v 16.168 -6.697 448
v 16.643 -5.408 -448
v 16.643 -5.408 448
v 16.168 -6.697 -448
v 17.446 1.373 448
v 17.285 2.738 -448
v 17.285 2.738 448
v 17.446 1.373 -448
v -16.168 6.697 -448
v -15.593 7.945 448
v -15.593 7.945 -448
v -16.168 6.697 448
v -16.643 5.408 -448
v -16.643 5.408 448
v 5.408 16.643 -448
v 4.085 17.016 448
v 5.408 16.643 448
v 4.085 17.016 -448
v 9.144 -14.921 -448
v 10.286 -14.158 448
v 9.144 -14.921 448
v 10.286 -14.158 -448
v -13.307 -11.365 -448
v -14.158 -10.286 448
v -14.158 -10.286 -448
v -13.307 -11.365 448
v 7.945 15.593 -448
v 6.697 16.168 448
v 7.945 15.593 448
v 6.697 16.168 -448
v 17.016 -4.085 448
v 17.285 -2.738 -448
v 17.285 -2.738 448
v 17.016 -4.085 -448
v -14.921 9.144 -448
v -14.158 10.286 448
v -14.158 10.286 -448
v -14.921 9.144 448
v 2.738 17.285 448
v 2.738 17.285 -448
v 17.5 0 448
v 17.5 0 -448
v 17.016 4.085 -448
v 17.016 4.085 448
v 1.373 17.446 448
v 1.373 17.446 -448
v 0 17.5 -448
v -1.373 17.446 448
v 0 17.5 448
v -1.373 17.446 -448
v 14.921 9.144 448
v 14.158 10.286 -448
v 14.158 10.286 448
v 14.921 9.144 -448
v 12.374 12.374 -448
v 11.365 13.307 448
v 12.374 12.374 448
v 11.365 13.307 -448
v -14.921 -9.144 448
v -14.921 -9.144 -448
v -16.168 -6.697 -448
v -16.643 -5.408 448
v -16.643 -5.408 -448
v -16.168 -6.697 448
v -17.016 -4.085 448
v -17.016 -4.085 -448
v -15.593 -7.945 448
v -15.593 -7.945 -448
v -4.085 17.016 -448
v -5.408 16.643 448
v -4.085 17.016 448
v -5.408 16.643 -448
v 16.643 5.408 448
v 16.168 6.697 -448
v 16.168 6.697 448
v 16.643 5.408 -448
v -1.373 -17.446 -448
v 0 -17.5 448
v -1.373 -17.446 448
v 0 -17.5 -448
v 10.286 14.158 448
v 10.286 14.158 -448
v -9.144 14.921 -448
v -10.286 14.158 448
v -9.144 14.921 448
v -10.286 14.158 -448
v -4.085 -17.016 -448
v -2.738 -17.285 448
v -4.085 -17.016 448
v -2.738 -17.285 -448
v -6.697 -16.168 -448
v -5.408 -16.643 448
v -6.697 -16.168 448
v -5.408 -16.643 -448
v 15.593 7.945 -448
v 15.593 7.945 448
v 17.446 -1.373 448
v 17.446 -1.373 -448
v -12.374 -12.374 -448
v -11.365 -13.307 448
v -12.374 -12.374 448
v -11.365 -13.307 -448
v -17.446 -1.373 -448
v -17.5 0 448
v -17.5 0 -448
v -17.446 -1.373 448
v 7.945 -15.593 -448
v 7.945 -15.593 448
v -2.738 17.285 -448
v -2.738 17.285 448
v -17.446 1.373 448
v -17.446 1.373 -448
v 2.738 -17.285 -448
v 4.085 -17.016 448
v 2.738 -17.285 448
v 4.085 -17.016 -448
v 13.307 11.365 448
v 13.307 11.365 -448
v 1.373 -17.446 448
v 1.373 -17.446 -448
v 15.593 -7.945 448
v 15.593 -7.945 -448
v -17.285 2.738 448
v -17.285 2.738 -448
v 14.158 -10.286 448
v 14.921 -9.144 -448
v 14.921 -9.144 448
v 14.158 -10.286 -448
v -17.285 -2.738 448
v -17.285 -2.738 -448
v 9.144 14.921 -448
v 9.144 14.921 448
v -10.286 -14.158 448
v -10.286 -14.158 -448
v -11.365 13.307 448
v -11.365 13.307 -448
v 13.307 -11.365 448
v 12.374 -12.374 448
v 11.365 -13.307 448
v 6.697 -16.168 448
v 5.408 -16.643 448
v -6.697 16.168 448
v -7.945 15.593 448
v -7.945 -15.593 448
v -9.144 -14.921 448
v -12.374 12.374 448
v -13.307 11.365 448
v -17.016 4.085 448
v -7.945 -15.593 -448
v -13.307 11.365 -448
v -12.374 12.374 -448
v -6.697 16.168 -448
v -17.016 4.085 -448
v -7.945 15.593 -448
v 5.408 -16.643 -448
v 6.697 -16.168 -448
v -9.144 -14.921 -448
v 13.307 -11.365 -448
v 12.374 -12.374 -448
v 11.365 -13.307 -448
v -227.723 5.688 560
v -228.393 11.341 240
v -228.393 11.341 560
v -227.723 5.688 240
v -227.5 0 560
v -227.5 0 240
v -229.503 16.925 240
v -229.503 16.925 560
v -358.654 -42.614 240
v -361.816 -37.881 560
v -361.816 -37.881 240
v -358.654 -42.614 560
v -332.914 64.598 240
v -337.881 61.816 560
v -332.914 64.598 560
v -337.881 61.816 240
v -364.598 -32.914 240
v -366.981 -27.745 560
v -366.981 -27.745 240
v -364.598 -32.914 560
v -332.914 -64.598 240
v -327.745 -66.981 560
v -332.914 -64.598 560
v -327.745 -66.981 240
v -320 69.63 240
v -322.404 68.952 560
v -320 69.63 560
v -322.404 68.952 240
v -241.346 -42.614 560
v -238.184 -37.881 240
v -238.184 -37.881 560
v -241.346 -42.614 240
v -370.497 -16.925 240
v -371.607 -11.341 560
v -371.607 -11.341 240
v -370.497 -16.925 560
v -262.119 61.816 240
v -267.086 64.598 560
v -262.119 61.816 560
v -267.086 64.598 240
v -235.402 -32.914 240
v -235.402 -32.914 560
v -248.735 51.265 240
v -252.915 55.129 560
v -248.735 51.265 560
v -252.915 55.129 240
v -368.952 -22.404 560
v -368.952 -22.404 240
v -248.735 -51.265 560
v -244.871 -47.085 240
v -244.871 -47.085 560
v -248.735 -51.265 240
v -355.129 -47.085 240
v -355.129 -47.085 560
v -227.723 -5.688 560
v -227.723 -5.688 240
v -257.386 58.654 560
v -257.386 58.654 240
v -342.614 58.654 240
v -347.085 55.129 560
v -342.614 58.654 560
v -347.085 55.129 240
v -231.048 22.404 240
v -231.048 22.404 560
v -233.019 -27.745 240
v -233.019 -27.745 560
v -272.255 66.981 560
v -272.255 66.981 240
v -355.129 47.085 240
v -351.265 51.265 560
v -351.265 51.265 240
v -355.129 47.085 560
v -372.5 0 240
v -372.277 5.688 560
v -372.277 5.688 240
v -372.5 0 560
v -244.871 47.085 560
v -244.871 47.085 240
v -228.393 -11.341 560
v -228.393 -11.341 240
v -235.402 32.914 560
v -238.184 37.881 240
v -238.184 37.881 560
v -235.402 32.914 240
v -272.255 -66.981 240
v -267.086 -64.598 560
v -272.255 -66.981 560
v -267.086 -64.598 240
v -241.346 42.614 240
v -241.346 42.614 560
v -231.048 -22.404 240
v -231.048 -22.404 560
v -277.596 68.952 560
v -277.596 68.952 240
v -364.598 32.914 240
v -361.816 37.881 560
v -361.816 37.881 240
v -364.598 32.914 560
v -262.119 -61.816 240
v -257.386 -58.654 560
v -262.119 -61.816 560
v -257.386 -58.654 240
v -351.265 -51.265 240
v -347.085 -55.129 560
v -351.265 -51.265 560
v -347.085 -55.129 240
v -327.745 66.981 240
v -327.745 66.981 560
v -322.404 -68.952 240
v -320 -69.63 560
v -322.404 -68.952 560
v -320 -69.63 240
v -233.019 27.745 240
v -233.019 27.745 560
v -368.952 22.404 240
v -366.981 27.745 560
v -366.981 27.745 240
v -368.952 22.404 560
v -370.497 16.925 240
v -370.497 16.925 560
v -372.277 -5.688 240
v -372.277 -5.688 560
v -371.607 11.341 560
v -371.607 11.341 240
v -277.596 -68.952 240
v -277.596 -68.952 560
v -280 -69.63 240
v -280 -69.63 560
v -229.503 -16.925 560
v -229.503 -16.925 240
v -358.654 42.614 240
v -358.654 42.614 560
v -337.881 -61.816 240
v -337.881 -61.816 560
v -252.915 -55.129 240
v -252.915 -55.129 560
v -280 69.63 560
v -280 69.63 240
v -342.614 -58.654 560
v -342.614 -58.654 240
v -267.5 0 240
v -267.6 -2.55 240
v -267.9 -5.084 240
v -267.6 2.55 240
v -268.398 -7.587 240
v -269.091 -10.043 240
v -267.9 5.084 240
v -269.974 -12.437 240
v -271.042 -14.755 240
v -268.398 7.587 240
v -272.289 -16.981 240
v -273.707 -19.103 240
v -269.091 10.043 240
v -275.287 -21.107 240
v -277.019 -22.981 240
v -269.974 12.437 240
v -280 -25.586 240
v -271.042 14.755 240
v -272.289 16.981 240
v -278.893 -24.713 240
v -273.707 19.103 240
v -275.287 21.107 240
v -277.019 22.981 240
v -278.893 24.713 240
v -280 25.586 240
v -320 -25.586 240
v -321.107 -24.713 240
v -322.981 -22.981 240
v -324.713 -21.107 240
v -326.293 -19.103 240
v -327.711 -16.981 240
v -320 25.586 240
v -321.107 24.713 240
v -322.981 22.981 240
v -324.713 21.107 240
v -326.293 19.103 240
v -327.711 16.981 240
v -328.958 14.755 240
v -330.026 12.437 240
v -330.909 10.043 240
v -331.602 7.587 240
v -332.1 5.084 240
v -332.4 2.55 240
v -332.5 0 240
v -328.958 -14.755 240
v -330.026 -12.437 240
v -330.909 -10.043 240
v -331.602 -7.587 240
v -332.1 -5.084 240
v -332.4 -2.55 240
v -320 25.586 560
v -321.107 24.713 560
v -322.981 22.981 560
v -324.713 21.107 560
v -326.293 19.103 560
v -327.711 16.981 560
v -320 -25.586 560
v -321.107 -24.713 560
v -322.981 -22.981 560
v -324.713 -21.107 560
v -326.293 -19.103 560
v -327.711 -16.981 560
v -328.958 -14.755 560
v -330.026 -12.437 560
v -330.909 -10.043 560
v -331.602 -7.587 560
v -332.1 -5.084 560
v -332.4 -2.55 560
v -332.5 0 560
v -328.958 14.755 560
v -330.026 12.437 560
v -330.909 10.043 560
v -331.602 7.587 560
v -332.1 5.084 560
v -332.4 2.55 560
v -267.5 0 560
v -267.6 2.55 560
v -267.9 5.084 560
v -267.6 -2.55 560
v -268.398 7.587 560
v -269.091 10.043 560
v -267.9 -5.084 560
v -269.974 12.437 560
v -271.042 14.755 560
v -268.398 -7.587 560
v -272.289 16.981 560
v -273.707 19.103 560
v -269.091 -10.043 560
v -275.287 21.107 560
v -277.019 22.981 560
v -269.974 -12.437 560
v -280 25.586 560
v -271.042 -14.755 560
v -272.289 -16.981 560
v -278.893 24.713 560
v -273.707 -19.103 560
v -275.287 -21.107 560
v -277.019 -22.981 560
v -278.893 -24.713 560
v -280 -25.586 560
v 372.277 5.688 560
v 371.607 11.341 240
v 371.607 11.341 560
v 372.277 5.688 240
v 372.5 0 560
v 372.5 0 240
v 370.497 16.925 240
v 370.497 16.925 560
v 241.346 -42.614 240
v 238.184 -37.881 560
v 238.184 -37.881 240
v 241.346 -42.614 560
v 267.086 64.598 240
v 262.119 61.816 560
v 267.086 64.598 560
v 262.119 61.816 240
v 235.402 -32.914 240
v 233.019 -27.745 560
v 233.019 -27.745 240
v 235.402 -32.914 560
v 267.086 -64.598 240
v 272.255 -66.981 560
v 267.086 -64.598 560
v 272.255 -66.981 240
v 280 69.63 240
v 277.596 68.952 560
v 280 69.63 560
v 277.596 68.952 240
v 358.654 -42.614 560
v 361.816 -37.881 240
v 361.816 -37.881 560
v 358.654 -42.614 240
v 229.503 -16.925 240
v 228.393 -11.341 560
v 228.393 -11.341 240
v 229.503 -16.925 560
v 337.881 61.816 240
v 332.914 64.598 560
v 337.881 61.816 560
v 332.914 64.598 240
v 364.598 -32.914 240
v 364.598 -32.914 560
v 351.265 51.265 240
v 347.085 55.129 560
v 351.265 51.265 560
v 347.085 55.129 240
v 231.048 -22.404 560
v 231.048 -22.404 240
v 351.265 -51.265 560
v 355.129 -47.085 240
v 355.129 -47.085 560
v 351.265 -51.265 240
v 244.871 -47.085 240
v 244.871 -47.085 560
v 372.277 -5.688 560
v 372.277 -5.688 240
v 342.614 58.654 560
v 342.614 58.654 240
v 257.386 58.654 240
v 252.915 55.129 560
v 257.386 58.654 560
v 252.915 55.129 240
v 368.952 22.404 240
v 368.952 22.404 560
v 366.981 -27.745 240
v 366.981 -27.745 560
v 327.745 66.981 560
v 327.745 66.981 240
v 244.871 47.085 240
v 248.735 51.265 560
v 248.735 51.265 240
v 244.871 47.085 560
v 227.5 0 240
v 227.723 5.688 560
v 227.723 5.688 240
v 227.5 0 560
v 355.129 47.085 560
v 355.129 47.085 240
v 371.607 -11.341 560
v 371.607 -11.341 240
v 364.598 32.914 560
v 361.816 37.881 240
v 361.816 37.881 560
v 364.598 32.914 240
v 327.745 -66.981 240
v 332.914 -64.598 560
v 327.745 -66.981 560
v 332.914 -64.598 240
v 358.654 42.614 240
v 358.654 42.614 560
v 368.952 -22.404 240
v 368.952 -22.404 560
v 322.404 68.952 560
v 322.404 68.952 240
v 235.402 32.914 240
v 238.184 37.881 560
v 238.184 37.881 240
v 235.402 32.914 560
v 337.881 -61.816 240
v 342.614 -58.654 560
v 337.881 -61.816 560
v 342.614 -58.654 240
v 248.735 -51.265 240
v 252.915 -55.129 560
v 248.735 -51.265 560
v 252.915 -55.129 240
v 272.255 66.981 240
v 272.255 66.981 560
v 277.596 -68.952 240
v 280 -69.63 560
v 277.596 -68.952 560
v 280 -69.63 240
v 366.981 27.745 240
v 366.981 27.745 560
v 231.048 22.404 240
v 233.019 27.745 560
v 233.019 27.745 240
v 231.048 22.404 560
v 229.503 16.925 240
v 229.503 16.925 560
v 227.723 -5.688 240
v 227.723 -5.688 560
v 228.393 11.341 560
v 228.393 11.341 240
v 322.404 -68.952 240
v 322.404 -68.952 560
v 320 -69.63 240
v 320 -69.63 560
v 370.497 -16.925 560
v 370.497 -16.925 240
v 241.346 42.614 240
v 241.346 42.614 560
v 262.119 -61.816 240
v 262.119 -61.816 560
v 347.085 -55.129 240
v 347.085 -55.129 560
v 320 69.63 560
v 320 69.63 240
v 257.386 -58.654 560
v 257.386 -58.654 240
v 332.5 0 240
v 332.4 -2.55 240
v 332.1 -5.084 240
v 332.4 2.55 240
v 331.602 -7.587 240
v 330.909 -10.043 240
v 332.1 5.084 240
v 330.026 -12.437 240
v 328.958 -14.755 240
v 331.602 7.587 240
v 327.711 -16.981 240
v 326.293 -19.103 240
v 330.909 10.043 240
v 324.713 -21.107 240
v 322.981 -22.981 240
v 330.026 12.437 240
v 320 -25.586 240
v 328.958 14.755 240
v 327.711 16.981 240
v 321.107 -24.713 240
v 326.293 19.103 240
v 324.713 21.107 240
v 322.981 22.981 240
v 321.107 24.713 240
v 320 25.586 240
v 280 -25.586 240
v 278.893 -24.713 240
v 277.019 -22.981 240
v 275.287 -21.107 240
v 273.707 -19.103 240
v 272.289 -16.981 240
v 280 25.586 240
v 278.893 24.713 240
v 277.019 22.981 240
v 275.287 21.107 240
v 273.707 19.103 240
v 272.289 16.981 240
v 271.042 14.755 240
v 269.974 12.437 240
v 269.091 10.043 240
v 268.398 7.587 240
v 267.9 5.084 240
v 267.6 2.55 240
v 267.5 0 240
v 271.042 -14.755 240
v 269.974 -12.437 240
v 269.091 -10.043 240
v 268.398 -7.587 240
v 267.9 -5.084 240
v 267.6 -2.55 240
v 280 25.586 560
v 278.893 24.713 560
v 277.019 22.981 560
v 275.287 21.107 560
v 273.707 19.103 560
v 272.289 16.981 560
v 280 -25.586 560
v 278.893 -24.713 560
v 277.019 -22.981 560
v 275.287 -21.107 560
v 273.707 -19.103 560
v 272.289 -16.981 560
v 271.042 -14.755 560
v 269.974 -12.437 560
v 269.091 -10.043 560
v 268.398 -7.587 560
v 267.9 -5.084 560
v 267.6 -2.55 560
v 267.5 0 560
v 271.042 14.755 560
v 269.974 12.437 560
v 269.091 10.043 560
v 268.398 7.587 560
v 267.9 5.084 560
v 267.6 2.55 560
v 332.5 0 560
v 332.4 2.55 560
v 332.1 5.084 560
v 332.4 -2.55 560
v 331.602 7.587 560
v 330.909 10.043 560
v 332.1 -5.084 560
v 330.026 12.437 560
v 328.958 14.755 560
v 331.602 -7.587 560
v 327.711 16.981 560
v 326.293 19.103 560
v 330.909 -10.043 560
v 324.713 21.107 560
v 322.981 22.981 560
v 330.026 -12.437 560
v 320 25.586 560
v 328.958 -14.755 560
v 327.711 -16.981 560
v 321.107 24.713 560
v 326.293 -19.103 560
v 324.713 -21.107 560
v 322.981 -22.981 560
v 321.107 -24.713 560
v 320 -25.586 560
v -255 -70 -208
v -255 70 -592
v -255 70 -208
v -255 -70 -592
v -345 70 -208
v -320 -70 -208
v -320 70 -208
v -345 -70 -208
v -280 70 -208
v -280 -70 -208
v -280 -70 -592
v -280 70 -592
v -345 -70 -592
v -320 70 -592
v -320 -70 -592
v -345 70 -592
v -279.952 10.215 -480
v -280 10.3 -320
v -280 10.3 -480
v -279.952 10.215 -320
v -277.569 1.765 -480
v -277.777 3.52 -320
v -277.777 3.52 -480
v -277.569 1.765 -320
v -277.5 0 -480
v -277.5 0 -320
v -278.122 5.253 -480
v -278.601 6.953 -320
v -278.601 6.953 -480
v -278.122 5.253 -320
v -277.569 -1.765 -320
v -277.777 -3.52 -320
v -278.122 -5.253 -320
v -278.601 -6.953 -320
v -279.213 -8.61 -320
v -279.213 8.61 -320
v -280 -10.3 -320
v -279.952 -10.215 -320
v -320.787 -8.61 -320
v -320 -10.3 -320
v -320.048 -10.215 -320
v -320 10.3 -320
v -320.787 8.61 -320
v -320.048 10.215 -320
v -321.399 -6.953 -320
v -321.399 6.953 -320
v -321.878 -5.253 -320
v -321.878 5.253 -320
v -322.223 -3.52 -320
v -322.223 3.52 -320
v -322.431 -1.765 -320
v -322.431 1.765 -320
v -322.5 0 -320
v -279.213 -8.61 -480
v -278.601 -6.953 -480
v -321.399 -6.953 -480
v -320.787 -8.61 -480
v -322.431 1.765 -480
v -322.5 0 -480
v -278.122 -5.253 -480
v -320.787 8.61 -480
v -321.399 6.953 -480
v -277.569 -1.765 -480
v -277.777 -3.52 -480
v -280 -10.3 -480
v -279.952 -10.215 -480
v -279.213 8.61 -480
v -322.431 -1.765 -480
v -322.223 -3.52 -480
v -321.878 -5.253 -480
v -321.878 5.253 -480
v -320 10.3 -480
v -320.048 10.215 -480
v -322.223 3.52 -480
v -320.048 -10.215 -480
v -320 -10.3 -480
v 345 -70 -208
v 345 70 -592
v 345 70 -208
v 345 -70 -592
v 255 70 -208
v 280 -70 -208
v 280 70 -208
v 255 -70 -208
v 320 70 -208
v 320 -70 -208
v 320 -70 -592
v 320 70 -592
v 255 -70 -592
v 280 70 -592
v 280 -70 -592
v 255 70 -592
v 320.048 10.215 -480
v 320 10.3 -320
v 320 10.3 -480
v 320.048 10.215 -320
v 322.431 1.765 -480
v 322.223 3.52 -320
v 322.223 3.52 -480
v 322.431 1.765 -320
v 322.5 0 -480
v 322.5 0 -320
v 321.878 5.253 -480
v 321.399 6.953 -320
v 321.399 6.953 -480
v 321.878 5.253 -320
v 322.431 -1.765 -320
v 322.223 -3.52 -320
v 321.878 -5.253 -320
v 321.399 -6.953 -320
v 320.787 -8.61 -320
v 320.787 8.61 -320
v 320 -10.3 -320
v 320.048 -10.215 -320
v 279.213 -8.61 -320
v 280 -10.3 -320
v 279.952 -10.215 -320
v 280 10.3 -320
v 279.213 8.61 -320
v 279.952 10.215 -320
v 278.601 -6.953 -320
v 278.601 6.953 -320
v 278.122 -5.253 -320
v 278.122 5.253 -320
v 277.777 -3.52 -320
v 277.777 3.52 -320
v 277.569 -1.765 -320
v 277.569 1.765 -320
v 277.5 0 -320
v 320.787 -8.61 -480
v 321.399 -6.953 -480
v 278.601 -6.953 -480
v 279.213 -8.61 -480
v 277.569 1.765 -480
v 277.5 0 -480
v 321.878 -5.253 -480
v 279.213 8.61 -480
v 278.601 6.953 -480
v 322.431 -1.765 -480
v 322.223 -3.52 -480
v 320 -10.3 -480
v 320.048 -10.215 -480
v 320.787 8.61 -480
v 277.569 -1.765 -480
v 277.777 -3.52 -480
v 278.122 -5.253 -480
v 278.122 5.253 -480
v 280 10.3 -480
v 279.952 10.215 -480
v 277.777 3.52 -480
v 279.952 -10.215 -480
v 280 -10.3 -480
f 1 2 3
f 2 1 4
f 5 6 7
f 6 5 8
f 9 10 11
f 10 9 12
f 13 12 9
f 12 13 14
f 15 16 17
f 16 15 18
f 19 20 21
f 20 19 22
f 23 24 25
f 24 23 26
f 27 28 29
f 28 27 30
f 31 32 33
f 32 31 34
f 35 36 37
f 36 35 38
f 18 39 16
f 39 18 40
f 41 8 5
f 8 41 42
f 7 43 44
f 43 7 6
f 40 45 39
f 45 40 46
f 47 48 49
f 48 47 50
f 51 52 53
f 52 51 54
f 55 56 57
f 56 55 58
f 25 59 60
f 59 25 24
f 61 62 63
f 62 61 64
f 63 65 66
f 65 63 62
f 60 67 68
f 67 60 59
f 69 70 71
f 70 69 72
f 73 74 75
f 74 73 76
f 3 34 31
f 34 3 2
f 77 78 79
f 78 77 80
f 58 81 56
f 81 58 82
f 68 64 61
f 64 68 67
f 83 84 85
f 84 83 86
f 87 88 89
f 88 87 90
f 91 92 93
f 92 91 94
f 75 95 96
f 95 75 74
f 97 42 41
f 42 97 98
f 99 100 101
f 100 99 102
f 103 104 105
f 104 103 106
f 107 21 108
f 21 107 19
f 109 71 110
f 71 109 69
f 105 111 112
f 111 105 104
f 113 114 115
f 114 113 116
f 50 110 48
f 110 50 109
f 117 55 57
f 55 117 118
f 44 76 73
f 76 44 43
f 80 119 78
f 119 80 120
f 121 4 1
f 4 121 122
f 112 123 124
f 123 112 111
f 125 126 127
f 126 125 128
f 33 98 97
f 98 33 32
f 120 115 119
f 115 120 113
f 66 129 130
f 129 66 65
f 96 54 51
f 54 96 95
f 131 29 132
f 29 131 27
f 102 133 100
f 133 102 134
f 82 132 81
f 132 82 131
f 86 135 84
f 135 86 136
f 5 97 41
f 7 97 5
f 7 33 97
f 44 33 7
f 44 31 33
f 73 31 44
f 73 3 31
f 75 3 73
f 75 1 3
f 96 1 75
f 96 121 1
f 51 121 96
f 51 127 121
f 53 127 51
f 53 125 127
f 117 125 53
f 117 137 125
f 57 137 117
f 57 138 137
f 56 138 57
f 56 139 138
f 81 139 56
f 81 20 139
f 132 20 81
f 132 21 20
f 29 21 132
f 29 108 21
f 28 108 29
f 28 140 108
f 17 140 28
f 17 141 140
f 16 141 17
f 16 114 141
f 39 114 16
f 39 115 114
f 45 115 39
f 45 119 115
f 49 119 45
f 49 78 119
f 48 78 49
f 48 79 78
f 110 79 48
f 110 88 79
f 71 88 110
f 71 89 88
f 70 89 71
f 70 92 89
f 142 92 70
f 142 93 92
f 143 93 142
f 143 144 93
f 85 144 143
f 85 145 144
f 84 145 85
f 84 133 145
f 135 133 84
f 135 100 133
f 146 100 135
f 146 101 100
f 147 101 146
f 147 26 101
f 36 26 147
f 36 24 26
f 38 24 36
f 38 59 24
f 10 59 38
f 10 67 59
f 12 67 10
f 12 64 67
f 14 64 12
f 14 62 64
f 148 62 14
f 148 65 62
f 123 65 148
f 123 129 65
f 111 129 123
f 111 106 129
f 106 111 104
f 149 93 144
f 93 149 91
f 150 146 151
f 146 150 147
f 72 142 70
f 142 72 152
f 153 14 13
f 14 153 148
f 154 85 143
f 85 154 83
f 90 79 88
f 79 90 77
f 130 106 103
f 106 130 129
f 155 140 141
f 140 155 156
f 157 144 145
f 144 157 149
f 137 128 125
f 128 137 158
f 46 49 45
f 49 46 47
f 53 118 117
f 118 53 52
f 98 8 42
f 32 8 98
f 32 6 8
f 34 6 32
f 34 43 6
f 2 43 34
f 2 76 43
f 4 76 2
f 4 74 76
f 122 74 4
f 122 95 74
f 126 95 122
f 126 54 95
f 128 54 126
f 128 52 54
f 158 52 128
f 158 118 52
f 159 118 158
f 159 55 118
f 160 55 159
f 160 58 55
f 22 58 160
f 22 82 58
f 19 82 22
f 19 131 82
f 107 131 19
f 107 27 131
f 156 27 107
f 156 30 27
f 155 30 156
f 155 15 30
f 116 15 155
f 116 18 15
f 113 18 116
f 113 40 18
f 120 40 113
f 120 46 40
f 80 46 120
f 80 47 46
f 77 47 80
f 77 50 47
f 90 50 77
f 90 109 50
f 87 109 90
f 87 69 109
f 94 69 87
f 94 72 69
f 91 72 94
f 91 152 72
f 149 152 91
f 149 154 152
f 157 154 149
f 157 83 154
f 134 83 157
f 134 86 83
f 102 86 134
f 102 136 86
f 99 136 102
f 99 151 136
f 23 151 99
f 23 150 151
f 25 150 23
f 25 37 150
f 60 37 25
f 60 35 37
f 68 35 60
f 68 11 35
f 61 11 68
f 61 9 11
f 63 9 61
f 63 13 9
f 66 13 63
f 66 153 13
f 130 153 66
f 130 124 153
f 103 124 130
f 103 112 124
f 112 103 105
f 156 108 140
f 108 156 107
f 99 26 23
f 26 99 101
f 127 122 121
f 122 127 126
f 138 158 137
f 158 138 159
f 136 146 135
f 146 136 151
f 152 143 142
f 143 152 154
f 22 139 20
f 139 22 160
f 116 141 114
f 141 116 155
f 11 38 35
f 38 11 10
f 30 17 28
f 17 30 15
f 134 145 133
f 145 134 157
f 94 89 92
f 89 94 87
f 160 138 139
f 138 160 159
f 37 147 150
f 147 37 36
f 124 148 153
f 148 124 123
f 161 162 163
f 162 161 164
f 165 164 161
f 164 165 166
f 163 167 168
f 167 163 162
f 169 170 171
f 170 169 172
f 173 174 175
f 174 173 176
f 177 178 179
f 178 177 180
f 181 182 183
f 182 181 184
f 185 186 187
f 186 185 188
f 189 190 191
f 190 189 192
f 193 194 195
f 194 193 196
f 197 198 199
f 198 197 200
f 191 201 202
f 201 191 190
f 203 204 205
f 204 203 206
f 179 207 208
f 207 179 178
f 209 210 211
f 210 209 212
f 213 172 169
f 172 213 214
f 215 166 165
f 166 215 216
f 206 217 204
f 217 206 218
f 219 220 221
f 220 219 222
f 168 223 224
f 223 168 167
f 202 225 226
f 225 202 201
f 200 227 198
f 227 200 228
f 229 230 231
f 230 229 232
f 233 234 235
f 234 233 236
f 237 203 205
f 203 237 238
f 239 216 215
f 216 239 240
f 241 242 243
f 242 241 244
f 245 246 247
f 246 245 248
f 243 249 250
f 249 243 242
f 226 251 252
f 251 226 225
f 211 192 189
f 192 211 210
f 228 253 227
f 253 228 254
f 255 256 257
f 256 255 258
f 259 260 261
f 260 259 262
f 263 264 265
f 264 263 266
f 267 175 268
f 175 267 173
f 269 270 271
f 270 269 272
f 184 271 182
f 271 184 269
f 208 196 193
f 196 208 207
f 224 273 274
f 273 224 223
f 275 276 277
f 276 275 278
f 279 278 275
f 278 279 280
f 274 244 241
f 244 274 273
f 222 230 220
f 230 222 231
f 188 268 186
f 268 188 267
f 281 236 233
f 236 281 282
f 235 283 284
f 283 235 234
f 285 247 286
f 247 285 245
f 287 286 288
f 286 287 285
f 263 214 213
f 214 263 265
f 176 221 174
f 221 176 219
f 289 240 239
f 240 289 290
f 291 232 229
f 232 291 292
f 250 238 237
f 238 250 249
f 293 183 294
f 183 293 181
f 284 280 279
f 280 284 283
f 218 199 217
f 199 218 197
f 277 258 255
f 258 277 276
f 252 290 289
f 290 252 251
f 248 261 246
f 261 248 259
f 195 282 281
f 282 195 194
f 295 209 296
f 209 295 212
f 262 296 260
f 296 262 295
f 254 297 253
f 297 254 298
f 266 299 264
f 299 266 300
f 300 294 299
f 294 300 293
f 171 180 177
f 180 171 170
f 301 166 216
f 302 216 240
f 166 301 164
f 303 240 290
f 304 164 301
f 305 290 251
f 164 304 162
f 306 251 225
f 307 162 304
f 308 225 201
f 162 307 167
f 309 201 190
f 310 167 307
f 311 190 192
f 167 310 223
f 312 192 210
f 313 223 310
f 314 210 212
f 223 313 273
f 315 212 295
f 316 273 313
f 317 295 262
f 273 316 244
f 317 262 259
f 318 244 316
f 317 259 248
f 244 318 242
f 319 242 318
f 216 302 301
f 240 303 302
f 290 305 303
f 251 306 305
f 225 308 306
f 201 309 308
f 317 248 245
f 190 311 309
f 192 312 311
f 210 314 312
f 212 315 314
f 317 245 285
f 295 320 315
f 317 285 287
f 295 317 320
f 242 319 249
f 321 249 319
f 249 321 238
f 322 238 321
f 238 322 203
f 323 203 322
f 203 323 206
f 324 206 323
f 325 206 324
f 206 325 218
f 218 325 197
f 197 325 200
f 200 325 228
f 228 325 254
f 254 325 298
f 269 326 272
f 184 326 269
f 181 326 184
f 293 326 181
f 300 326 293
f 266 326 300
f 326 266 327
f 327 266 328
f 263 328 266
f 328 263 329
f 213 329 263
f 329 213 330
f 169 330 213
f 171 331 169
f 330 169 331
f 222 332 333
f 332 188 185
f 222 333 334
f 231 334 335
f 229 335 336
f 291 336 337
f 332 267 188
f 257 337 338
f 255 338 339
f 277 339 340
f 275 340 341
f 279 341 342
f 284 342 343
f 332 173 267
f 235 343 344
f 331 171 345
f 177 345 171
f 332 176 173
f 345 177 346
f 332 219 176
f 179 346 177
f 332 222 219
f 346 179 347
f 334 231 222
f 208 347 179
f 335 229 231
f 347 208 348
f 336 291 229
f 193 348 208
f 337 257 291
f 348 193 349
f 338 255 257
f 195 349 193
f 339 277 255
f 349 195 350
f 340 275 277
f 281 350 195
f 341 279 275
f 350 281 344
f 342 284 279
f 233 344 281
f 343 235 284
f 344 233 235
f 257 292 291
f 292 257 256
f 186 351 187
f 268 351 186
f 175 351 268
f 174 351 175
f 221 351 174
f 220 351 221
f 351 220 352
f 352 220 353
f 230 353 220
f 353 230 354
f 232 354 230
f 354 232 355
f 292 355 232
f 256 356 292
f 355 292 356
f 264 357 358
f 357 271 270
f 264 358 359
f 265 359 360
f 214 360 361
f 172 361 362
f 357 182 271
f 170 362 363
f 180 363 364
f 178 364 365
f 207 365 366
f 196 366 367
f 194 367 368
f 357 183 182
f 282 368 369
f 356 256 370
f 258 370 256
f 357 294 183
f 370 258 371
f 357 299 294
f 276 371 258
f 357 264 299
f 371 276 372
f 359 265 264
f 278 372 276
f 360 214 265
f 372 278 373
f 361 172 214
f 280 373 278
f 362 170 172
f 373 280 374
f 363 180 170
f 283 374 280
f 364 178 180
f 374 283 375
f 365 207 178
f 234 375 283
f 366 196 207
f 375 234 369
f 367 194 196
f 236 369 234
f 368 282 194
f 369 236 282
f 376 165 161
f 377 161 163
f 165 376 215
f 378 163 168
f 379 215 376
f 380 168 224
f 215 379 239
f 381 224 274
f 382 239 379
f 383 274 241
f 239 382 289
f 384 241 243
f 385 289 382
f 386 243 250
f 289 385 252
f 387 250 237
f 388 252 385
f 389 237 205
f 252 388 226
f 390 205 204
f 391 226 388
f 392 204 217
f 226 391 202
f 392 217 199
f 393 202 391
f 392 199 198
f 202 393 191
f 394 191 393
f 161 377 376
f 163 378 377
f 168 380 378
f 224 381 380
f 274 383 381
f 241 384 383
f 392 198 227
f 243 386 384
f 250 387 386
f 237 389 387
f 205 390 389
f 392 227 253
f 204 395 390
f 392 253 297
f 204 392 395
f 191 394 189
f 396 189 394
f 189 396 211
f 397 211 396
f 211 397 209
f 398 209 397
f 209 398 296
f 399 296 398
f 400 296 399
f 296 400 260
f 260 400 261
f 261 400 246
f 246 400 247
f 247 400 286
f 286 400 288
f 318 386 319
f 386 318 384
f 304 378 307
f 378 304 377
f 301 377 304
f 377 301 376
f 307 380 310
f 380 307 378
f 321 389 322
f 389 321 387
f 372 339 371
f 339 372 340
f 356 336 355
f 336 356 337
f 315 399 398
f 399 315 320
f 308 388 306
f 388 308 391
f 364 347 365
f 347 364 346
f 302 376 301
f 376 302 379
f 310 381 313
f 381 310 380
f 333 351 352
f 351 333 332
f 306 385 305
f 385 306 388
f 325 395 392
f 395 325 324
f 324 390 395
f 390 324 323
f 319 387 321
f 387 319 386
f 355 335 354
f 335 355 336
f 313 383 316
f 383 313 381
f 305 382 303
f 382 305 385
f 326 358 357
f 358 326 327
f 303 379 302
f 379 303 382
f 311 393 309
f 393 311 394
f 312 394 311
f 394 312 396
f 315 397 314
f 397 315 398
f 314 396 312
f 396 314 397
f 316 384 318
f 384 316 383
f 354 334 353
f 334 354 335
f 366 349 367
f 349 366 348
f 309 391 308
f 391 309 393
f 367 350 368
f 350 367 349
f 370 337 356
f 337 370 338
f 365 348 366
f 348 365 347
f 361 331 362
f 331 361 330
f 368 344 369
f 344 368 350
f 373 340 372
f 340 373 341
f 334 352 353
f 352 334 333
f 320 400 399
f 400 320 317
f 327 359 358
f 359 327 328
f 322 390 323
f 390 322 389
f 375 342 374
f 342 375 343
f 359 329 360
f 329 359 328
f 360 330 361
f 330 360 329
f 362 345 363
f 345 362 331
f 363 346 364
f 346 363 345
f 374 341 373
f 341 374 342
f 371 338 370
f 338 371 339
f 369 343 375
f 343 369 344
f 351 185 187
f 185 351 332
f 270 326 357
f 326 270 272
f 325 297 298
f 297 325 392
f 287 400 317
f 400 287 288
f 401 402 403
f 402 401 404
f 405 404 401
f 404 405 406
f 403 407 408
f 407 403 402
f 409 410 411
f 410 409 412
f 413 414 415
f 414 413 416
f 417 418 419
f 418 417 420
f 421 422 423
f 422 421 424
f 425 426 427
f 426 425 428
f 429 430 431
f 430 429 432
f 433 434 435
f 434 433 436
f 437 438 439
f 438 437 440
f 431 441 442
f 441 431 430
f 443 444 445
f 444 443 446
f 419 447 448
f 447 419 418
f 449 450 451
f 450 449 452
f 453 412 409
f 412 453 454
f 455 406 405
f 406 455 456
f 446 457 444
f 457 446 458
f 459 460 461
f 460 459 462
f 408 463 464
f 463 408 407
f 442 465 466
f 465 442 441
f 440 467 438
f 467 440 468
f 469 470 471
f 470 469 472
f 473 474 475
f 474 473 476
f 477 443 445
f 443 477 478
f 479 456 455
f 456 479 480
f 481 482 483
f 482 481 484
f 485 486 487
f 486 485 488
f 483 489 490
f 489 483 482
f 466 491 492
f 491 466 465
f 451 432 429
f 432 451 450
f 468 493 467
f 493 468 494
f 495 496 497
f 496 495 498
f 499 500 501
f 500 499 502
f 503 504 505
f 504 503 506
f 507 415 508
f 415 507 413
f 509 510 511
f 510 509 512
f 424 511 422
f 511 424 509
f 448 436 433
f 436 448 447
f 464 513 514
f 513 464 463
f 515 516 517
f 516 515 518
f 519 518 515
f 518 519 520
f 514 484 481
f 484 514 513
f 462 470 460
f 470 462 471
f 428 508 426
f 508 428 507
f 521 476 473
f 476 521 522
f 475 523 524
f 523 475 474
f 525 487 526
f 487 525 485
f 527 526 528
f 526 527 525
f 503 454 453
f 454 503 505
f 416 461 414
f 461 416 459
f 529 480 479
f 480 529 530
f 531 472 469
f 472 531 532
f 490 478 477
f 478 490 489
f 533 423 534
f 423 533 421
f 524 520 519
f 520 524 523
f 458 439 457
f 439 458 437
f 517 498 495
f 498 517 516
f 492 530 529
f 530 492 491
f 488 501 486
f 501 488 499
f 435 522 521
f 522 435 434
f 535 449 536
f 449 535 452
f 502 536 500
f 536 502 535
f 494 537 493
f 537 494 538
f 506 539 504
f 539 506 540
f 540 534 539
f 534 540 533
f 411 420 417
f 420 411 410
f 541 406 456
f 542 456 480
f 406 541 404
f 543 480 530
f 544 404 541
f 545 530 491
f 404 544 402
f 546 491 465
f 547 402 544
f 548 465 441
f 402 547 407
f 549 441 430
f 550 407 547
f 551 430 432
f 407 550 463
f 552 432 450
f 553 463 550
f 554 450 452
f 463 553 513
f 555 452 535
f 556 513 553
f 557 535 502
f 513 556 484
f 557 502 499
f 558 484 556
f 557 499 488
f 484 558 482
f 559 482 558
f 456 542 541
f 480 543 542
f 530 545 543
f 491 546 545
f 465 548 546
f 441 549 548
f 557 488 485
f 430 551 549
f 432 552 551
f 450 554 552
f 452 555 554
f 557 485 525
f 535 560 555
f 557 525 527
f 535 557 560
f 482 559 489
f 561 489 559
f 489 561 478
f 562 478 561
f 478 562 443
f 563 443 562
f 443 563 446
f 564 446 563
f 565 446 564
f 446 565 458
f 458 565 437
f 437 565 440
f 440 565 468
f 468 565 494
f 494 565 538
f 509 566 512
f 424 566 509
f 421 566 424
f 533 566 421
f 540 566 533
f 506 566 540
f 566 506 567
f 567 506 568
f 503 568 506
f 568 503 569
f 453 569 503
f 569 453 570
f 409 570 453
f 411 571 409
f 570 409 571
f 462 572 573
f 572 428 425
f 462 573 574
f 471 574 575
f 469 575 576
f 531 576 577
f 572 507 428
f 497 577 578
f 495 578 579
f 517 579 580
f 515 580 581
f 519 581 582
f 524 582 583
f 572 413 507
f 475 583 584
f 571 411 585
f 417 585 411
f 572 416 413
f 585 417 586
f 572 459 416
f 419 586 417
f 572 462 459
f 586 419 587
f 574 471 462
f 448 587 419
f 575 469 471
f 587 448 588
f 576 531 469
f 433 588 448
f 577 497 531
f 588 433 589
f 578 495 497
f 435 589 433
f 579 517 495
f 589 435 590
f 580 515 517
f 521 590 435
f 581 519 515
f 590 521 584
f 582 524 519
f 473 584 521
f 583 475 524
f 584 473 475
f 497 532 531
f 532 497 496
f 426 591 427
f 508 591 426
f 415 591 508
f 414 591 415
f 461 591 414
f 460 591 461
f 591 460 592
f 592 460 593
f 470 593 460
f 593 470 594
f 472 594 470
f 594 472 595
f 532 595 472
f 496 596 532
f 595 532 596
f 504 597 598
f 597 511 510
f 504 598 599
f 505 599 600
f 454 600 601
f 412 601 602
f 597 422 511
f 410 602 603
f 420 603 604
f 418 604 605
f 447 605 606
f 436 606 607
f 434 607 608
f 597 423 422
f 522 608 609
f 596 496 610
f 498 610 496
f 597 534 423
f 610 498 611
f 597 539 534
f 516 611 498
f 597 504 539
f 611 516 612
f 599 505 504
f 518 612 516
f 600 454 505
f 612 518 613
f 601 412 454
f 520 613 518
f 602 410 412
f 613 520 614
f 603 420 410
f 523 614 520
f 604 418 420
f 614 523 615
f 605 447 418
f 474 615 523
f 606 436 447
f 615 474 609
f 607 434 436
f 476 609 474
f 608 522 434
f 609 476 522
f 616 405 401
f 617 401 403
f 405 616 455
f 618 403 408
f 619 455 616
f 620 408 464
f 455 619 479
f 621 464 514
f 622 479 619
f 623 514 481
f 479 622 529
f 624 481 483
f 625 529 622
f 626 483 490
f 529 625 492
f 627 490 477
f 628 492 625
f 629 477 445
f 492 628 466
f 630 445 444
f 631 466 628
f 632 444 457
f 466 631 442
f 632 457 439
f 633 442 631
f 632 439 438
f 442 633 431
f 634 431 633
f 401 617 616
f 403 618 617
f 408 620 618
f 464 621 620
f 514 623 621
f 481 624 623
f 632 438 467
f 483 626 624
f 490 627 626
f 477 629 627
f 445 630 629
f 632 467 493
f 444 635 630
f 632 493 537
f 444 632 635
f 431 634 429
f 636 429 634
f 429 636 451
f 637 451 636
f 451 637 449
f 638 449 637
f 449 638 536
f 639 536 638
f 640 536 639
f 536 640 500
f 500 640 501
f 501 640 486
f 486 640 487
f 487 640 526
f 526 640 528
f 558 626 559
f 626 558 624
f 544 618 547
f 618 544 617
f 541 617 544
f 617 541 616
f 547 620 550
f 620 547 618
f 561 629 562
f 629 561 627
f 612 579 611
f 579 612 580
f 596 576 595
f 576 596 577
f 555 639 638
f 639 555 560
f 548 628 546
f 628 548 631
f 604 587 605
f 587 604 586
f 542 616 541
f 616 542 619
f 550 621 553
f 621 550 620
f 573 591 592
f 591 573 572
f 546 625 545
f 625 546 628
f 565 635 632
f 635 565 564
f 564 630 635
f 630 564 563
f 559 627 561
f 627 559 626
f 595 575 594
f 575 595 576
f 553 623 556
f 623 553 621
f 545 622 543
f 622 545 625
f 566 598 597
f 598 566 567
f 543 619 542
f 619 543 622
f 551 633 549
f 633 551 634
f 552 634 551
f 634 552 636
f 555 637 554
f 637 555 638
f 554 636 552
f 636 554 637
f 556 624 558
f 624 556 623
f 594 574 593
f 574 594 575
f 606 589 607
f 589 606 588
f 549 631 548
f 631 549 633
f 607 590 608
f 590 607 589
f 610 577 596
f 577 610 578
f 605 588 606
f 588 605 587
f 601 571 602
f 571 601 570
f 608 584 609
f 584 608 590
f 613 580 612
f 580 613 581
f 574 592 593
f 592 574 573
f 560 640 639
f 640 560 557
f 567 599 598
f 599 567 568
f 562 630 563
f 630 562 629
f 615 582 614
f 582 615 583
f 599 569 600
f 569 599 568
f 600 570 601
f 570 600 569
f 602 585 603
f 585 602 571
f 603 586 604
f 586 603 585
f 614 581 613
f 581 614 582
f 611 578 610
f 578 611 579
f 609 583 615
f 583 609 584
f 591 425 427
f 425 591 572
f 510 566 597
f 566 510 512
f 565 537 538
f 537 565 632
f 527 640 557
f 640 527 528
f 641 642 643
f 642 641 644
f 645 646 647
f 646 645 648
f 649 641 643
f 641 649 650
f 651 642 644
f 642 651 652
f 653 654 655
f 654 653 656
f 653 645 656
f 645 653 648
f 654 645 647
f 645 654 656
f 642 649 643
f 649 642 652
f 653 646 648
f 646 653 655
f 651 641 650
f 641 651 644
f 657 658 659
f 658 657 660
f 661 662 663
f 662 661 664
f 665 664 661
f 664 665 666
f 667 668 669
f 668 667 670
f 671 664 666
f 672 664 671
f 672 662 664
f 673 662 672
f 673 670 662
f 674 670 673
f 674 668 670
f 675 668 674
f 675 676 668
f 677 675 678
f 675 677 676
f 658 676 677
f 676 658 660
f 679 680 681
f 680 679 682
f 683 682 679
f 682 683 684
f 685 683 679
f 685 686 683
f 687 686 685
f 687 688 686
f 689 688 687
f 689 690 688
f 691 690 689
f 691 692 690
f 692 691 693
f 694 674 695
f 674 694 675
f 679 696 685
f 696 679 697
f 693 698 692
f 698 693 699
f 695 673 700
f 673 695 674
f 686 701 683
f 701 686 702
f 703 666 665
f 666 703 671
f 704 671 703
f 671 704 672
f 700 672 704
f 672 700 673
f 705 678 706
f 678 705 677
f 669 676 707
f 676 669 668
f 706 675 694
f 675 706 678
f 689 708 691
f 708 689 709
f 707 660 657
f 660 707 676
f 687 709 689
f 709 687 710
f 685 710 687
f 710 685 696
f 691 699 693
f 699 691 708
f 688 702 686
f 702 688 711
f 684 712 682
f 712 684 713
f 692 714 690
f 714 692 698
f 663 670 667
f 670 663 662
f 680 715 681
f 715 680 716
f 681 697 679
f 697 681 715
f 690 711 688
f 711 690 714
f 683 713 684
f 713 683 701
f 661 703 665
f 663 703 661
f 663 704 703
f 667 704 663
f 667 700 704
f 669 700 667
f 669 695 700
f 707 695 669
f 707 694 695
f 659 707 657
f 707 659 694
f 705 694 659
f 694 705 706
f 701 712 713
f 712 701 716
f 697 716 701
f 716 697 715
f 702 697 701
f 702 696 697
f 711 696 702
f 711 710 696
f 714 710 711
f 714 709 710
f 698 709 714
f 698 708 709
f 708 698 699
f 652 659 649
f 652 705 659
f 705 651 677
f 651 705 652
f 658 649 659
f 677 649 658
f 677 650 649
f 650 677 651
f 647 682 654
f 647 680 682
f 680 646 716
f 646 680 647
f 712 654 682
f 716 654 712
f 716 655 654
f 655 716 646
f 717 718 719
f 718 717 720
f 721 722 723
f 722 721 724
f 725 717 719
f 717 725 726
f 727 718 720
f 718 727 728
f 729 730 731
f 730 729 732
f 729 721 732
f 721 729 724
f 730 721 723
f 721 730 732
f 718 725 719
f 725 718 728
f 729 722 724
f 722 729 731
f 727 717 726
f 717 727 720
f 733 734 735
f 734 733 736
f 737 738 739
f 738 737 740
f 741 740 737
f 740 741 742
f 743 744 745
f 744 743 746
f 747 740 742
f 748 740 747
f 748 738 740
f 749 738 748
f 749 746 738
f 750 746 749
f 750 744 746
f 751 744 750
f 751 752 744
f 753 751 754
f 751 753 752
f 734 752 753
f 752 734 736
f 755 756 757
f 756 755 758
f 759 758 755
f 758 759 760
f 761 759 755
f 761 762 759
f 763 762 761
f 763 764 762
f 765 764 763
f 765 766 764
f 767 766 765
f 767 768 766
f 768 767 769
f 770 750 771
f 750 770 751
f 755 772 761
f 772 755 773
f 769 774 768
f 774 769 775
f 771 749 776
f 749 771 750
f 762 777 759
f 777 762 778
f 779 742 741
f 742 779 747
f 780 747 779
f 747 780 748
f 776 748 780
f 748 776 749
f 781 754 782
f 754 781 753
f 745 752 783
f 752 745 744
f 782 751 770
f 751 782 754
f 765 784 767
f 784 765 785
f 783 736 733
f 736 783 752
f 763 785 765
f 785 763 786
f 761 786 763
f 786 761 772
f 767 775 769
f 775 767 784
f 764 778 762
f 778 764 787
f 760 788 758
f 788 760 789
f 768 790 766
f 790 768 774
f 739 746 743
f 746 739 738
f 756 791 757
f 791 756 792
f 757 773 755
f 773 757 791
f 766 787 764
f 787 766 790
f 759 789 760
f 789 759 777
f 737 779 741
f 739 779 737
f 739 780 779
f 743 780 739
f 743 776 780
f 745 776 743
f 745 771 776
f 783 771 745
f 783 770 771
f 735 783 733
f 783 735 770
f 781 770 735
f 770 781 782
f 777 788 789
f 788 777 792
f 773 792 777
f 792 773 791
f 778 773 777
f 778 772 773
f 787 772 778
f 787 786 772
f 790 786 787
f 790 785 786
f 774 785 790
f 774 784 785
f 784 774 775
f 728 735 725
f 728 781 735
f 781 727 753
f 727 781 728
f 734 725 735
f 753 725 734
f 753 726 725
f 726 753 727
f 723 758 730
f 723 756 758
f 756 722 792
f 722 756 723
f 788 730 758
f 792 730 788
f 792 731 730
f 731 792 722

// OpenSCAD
// ============================================================================
// PROJECT: XXXG-00W0 WING GUNDAM ZERO EW - MANIPULATOR ARTICULATION CORE
// COMPONENT VAULT: BANDAI CAST RUNNER J - FINGER KNUCKLES J1 THROUGH J4
// MANUFACTURING SPECS: SOLID-STATE CAST-IN INDUCTIVE POWER HARNESS TERMINALS
// DESIGN PARITY: THREE-PHALANX PARALLEL BONES & MICRO-CYCLOIDAL BORES
// ============================================================================

$fn = 80; // High-precision circular rendering resolution segment count

// Structural Constants Scaled 1:1 for a 16.7-Meter Airframe Scale (mm)
knuckle_axis_length = 320;              // Total vertical thickness of knuckle (mm)
cycloidal_bore_diameter = 65;           // Inner cycloidal reduction ring bore (mm)
bone_wall_thickness = 40;               // Solid TiAl structural core thickness (mm)
harness_conduit_width = 40;             // Cast-in 4oz copper logic trace track (mm)
inductive_recess_diameter = 110;         // Mounting slot for wireless palm pads (mm)

module Runner_J_Knuckle_Forge() {
    // Central Supply Injection Runner Axis (Molten Feed Line from Siphon Forge)
    color([0.22, 0.22, 0.25]) {
        cylinder(h = knuckle_axis_length * 2.8, d = 35, center = true);
        // Direct injection gates tracking straight into the part mold cavities
        translate() rotate() cylinder(h = 350, d = 18);
        translate([0, 0, -350]) rotate() cylinder(h = 350, d = 18);
    }
    
    // Instantiate Scaled Structural Molds Symmetrically (Left & Right Halves)
    Cast_Internal_Knuckle_Bones();
}

module Cast_Internal_Knuckle_Bones() {
    // ---- PARTS J1 & J2: PROXIMAL PHALANX KNUCKLE JOINTS ---- [Page 6, Step 3 & 4]
    color([0.4, 0.4, 0.42]) { // Inner Frame Gunmetal Spec
        // Left Proximal Knuckle Bone (J1)
        translate([-300, 0, 400])
            difference() {
                // Main solid bone knuckle mounting block segment
                cylinder(h = knuckle_axis_length, d = cycloidal_bore_diameter + (bone_wall_thickness * 2), center = true);
                
                // Central Cycloidal Reduction Track Bore (Houses pre-loaded rolling pins)
                cylinder(h = knuckle_axis_length + 20, d = cycloidal_bore_diameter, center = true);
                
                // Recess Pocket for the Inductive Palm Power Interface Contact Pad
                translate([0, (cycloidal_bore_diameter/2 + 10), 0])
                    rotate([0, 90, 0])
                        cylinder(h = 40, d = inductive_recess_diameter, center = true);
                        
                // Continuous cast-in routing track for the 4oz solid-state wiring rails
                cube([harness_conduit_width, cycloidal_bore_diameter + 100, knuckle_axis_length + 10], center = true);
            }
            
        // Right Proximal Knuckle Bone (J2)
        translate([300, 0, 400]) rotate()
            difference() {
                cylinder(h = knuckle_axis_length, d = cycloidal_bore_diameter + (bone_wall_thickness * 2), center = true);
                cylinder(h = knuckle_axis_length + 20, d = cycloidal_bore_diameter, center = true);
                translate([0, (cycloidal_bore_diameter/2 + 10), 0])
                    rotate([0, 90, 0])
                        cylinder(h = 40, d = inductive_recess_diameter, center = true);
                cube([harness_conduit_width, cycloidal_bore_diameter + 100, knuckle_axis_length + 10], center = true);
            }
    }
    
    // ---- PARTS J3 & J4: MIDDLE PHALANX ACTUATOR ARMS ---- [Page 6, Step 3 & 4]
    color([0.45, 0.45, 0.48]) {
        // Left Middle Actuator Arm (J3)
        translate([-300, 0, -400])
            difference() {
                cube([90, 140, knuckle_axis_length * 1.2], center = true);
                rotate() cylinder(h = 160, d = 45, center = true);
                cube([harness_conduit_width, 160, knuckle_axis_length * 1.5], center = true);
            }
            
        // Right Middle Actuator Arm (J4)
        translate([300, 0, -400]) rotate()
            difference() {
                cube([90, 140, knuckle_axis_length * 1.2], center = true);
                rotate() cylinder(h = 160, d = 45, center = true);
                cube([harness_conduit_width, 160, knuckle_axis_length * 1.5], center = true);
            }
    }
}

// Render Master Assembly to Parameter Workspace
Runner_J_Knuckle_Forge();
